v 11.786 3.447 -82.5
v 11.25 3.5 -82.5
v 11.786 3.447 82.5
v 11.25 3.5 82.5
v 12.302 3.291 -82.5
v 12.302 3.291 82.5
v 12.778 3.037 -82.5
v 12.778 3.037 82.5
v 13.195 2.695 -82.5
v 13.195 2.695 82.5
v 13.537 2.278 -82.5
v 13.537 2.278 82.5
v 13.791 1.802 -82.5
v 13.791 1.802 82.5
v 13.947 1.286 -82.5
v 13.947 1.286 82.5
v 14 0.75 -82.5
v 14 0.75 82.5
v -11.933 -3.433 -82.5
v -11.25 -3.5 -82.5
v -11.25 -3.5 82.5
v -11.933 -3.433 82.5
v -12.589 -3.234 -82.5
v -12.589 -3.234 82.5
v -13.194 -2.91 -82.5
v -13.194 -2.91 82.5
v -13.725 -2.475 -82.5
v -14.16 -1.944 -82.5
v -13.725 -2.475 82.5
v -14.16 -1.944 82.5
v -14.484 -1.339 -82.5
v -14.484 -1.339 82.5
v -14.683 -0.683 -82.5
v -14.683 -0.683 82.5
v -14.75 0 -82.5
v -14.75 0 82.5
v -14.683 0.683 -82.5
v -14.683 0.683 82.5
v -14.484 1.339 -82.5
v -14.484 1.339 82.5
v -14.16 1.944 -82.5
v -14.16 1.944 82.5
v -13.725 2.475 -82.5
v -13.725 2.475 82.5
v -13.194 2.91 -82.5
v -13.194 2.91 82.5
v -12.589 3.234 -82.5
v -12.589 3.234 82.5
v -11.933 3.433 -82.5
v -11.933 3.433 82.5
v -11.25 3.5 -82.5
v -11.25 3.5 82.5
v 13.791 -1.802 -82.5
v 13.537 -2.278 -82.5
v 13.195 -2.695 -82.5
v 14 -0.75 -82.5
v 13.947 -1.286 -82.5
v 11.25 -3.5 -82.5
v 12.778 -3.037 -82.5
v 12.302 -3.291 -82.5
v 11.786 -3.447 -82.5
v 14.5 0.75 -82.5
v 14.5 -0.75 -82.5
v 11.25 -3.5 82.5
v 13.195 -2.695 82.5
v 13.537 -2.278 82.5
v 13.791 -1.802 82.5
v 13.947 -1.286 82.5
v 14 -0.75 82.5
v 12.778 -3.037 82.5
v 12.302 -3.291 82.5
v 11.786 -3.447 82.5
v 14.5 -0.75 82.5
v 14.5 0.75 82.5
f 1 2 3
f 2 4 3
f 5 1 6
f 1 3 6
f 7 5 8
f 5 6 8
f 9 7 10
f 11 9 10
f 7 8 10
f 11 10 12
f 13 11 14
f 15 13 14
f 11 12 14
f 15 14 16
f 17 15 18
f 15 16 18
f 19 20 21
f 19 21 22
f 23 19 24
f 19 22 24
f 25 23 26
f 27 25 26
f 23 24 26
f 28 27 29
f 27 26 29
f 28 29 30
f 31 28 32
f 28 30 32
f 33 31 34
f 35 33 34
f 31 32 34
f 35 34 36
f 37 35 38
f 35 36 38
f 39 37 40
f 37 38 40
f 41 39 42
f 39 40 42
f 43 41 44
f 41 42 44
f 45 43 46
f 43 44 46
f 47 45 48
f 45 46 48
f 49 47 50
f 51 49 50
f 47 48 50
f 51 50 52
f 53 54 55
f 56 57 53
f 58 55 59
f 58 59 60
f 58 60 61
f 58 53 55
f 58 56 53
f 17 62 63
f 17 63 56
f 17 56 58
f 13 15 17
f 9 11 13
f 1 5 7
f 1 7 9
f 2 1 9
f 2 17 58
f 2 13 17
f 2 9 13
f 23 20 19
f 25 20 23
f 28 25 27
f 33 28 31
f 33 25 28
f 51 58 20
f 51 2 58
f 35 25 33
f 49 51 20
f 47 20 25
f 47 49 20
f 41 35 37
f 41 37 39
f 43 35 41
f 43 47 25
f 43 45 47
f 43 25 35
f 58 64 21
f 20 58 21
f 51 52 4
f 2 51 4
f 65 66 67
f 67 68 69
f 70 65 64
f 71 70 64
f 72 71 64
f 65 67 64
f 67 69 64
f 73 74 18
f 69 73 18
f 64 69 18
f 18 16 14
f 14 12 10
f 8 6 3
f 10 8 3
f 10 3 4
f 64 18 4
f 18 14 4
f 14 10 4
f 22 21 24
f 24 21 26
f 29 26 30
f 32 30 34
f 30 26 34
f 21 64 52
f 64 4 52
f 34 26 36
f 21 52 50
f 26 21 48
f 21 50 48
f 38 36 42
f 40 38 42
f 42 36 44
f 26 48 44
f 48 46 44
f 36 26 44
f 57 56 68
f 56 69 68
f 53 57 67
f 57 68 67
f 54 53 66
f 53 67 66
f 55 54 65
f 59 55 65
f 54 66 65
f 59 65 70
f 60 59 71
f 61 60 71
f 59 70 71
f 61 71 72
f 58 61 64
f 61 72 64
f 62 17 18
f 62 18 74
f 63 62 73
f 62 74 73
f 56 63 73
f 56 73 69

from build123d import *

# Parameters (mm, degrees)
BOSS_EXTRUDE1_DEPTH = 82.5


with BuildPart() as part:
    # Sketch1 → Boss-Extrude1 (new, symmetric)
    with BuildSketch(Plane.XY):
        with BuildLine():
            Line((-11.25, 3.5), (11.25, 3.5))
            ThreePointArc((11.25, 3.5), (13.194543648, 2.694543648), (14, 0.75))
            Line((14, 0.75), (14.5, 0.75))
            Line((14.5, 0.75), (14.5, -0.75))
            Line((14.5, -0.75), (14, -0.75))
            ThreePointArc((14, -0.75), (13.194543648, -2.694543648), (11.25, -3.5))
            Line((11.25, -3.5), (-11.25, -3.5))
            ThreePointArc((-11.25, -3.5), (-14.75, 0), (-11.25, 3.5))
        make_face()
    extrude(amount=BOSS_EXTRUDE1_DEPTH, both=True)


solid = part.part
